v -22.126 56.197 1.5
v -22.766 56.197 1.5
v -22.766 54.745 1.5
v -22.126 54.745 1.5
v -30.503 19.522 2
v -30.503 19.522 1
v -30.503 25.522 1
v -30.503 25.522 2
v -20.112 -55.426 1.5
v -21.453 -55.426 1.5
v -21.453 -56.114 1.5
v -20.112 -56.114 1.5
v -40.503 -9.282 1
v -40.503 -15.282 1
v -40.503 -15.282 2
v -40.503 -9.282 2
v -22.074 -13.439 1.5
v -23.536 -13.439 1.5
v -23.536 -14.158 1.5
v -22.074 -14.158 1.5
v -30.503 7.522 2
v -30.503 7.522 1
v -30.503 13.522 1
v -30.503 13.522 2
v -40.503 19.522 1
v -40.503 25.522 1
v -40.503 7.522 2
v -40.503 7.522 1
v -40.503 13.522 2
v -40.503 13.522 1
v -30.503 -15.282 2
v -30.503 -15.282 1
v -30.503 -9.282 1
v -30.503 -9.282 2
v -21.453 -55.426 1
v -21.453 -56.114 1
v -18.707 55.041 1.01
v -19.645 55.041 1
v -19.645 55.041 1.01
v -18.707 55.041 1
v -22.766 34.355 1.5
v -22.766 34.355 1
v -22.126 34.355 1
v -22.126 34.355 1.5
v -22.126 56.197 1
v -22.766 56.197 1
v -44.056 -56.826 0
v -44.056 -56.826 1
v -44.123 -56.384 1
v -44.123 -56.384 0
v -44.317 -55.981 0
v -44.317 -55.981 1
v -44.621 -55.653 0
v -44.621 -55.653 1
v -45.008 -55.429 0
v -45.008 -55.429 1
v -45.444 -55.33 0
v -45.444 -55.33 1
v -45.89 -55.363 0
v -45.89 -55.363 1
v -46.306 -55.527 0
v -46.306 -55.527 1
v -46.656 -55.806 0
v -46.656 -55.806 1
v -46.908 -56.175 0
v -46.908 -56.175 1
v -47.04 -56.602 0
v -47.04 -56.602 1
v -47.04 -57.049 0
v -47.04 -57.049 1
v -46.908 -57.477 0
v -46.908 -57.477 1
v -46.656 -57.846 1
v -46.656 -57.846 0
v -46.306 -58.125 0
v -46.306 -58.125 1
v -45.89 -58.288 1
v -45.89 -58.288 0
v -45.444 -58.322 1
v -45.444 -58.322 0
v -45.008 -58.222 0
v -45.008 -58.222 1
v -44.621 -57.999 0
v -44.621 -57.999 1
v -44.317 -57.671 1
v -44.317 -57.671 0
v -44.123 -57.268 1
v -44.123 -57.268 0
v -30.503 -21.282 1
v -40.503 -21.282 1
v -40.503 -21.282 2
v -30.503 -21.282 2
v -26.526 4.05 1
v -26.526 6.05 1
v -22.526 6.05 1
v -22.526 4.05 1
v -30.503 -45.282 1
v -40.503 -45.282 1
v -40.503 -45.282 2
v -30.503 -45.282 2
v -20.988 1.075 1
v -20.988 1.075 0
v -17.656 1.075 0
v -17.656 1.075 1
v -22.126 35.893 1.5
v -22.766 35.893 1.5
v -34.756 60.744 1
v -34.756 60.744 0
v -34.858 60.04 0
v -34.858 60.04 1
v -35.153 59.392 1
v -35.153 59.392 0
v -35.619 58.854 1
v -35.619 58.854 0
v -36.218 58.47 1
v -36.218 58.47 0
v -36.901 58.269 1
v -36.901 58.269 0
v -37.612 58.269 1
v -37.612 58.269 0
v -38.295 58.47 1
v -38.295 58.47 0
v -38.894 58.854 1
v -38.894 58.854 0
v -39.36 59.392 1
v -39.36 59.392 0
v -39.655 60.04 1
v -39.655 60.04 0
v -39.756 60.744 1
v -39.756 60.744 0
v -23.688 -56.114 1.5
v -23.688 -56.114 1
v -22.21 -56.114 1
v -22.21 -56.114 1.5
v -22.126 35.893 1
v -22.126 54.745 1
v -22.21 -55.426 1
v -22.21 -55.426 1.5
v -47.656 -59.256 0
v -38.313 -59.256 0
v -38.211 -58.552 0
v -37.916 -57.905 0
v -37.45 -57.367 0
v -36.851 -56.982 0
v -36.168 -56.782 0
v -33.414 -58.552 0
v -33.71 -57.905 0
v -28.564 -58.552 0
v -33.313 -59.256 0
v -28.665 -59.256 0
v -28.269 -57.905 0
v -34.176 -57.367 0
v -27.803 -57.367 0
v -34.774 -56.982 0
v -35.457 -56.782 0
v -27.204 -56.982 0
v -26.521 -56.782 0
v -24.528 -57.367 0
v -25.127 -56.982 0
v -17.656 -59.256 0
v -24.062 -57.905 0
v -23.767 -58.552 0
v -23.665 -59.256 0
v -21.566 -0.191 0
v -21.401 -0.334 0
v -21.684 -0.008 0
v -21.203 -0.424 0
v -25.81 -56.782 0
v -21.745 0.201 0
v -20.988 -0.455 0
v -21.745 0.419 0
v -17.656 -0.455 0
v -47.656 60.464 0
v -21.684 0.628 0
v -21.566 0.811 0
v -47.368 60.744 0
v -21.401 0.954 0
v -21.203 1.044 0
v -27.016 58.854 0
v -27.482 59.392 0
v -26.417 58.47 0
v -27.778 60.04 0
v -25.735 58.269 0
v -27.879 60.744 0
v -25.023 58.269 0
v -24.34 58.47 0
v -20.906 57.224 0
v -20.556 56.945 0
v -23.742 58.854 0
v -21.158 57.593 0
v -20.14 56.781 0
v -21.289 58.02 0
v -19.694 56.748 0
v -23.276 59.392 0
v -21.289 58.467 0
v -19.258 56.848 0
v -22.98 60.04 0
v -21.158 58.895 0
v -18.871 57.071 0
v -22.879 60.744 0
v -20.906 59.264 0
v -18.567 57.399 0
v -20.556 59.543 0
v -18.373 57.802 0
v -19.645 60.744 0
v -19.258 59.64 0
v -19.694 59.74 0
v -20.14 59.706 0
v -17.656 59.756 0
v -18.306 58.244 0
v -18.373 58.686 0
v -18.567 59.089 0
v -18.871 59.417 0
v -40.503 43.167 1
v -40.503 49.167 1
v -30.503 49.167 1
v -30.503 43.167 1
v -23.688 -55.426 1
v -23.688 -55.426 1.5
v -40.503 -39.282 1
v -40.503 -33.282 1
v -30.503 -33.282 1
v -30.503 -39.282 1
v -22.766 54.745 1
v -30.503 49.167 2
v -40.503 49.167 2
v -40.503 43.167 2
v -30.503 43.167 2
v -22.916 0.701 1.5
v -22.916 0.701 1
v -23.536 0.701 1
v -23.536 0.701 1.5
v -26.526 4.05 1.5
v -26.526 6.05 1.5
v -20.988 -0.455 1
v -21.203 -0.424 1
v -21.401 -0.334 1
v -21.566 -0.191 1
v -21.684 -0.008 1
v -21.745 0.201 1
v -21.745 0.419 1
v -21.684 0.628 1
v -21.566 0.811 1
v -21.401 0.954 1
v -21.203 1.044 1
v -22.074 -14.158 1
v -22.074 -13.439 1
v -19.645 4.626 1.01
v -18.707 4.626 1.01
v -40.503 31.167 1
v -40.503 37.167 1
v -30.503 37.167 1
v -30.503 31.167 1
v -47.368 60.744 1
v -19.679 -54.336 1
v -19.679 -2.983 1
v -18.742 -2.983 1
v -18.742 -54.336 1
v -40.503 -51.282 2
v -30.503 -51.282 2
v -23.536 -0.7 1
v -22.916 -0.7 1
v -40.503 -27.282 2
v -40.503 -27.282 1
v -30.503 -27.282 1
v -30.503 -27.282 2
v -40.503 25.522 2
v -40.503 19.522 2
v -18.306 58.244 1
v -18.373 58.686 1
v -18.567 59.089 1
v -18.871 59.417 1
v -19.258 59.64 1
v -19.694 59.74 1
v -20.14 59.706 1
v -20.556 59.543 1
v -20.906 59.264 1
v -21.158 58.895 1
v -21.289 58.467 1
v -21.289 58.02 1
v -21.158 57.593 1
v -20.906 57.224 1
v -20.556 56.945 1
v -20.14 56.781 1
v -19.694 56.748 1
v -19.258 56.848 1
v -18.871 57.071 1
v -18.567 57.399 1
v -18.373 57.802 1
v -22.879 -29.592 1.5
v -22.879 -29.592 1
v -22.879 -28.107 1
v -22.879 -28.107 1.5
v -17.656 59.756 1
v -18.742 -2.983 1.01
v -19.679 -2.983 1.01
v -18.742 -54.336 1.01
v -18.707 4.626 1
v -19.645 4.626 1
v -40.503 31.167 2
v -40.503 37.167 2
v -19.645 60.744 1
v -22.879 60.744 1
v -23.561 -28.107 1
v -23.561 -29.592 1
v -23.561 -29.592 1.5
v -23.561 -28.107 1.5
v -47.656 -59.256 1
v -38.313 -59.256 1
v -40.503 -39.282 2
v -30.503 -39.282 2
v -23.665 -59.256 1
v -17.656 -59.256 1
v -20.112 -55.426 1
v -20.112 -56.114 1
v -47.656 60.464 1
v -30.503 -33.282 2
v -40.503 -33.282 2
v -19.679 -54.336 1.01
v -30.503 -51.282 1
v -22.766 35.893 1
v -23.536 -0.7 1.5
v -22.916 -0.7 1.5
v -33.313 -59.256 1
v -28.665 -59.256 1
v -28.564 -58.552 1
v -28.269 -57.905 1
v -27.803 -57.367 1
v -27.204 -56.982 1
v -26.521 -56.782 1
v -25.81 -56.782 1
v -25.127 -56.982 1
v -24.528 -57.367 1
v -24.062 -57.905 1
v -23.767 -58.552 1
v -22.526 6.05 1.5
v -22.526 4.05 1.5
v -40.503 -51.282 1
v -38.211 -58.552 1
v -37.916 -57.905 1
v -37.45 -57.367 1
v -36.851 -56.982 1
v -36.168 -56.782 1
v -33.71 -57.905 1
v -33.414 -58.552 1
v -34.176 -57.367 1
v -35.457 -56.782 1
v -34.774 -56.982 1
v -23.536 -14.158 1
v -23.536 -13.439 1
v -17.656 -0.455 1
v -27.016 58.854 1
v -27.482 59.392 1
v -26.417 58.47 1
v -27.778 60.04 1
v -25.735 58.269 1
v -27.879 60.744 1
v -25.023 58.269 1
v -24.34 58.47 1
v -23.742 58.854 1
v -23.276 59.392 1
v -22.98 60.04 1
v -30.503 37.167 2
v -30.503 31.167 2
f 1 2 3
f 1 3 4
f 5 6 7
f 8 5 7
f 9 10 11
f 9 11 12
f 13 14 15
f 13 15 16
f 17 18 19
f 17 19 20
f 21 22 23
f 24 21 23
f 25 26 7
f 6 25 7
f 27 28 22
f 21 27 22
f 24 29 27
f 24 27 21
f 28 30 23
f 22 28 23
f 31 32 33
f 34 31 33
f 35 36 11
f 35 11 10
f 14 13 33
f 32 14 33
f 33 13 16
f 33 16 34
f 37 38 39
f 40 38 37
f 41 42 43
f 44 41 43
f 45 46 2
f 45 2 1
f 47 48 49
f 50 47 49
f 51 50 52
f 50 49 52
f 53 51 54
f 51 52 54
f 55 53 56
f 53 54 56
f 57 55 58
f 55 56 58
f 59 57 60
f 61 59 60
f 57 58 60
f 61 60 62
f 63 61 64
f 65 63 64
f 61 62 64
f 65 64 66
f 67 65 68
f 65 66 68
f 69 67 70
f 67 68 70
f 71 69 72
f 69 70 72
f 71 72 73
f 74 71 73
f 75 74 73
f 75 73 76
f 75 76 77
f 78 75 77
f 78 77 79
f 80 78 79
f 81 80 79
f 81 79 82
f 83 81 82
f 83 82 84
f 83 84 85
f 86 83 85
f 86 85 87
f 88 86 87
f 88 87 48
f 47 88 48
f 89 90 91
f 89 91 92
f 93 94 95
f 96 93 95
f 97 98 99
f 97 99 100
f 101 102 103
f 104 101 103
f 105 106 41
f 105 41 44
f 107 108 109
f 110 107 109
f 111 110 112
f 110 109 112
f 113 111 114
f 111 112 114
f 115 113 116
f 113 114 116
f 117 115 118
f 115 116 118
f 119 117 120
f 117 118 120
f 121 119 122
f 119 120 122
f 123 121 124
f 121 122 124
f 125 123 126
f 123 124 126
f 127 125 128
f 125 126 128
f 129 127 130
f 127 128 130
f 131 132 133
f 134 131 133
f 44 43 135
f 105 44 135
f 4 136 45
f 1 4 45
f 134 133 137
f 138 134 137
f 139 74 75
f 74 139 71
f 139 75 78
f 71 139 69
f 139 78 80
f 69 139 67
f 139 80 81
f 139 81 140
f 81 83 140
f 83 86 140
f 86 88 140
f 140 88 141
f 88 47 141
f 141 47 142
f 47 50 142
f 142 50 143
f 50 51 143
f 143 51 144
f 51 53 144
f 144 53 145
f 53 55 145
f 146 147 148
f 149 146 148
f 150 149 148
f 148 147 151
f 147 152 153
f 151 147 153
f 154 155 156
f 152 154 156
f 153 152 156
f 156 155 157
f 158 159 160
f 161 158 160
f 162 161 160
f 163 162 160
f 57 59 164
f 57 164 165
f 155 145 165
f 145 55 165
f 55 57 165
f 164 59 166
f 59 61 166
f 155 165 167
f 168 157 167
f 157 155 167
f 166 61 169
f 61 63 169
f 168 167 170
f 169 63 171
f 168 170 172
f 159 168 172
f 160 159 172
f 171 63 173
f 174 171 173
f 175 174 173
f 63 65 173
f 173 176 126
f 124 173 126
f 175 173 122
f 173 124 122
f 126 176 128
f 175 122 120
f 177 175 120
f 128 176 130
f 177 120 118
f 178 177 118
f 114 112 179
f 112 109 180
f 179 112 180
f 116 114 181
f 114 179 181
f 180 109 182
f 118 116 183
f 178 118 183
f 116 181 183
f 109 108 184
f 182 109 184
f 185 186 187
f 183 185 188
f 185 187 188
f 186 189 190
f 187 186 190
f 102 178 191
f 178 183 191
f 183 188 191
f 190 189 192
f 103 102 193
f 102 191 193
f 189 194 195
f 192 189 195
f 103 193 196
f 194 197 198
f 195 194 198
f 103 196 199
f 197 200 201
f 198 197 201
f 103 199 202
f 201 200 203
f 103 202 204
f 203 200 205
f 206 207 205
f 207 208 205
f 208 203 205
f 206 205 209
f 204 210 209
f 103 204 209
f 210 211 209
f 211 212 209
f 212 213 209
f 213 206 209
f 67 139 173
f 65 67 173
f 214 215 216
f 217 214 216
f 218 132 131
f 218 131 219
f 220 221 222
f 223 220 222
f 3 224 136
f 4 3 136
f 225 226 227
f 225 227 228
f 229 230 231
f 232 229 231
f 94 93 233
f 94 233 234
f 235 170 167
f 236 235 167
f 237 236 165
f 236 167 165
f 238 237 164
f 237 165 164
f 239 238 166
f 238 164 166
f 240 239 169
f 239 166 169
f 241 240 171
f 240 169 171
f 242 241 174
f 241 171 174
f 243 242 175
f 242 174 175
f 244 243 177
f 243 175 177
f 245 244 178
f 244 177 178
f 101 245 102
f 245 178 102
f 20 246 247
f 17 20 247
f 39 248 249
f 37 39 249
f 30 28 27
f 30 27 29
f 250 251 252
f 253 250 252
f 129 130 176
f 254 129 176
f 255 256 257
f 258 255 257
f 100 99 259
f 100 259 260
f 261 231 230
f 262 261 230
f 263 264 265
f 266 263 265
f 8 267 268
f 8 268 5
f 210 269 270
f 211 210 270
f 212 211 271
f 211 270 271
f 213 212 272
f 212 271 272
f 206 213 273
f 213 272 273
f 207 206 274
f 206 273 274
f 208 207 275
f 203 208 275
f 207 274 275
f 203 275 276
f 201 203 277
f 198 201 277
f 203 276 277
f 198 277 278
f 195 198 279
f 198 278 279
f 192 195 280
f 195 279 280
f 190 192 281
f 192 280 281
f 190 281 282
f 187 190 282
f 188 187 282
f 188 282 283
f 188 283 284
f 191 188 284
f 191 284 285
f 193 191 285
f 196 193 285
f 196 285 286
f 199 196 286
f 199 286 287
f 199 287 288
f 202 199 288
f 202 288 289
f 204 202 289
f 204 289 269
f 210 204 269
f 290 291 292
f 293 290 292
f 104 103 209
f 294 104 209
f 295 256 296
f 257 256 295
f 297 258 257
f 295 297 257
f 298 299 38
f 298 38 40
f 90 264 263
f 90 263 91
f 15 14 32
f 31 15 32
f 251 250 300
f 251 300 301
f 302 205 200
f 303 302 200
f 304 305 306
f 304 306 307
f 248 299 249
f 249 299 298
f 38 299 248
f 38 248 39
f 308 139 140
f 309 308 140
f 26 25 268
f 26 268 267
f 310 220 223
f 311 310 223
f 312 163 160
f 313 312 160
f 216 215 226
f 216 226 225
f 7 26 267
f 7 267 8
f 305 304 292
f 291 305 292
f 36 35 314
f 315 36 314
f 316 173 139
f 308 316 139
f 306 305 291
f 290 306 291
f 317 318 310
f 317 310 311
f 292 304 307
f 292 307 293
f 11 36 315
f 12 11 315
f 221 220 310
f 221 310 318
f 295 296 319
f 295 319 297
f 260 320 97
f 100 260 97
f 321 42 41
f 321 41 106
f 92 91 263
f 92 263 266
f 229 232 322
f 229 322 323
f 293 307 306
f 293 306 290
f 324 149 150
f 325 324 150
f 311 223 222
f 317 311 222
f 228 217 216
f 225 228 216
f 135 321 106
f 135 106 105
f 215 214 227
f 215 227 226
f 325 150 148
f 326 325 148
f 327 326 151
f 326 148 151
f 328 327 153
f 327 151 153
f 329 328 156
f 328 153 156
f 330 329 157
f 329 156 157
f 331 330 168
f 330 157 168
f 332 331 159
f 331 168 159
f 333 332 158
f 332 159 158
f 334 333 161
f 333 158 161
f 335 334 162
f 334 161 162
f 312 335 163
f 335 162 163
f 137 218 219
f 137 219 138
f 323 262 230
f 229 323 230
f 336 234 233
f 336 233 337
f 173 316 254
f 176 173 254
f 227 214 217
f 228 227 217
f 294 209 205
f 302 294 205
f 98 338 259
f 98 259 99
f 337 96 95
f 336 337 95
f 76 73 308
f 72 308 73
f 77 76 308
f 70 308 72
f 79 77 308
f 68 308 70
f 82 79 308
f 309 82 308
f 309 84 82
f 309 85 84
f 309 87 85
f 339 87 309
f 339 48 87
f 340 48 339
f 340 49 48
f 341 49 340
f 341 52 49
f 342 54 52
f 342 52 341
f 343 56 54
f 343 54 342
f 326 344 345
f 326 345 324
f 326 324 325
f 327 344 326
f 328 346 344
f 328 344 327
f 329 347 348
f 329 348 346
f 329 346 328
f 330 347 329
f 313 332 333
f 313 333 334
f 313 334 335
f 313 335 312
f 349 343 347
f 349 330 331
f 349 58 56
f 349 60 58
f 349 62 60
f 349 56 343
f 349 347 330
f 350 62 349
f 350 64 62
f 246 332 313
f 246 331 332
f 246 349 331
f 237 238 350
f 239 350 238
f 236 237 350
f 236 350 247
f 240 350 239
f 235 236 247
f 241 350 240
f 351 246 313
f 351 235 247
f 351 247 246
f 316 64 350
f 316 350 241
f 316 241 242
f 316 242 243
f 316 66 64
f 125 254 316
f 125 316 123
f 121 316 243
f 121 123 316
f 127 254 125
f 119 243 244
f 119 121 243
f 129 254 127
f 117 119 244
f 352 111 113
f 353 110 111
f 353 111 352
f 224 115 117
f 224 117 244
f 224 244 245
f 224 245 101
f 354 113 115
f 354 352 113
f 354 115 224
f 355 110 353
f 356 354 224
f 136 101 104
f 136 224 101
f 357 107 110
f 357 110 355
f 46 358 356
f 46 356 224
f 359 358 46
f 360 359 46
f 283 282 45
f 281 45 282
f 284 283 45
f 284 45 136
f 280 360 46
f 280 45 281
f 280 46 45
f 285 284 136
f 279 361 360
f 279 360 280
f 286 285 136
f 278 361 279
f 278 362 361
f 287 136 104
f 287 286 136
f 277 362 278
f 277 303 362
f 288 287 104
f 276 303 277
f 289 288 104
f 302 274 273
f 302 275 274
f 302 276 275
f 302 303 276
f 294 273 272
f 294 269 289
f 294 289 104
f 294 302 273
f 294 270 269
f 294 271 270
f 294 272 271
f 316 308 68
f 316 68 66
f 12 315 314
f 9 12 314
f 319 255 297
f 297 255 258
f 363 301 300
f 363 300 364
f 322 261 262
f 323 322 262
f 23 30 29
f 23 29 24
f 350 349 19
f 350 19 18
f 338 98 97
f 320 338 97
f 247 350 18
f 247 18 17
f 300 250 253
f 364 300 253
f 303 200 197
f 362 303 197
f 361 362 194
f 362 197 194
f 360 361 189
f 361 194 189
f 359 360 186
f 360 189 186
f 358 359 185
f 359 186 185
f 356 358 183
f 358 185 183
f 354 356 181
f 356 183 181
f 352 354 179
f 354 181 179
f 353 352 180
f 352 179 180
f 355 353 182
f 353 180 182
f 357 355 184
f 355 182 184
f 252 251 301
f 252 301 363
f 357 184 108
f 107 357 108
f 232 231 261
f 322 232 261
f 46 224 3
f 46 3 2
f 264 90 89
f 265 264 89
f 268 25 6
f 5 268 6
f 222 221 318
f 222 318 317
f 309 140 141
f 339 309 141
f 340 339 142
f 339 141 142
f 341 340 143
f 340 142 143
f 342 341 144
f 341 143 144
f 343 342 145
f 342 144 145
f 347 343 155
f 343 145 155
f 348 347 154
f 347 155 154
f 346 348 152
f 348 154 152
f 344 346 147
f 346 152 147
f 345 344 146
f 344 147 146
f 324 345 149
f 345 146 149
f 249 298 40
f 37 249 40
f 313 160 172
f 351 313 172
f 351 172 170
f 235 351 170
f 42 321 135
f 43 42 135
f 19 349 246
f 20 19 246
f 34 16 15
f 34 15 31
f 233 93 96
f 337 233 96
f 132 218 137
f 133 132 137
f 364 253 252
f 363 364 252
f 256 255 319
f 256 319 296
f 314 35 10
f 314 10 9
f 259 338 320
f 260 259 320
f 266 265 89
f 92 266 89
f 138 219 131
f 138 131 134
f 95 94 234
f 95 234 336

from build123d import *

# Parameters (mm, degrees)
F1_DEPTH  = 1
F2_W      = 10
F2_H      = 6
F3_DEPTH  = 1
F5_DEPTH  = 25
F6_R      = 1.5
F7_DEPTH  = 25
F8_W      = 4
F8_H      = 2
F9_DEPTH  = 0.5
F10_W     = 10
F10_H     = 6
F11_DEPTH = 1
F12_W     = 0.640901
F12_H     = 1.45201
F12_W_2   = 1.46237
F12_H_2   = 0.719787
F13_DEPTH = 0.5
F14_W     = 0.640901
F14_H     = 1.537751
F14_W_2   = 0.682369
F14_H_2   = 1.484867
F15_DEPTH = 0.5
F16_W     = 1.478707
F16_H     = 0.68773
F16_W_2   = 1.341155
F17_DEPTH = 0.5
F18_W     = 0.937498
F18_H     = 50.415176
F19_DEPTH = 0.01
F20_W     = 0.937
F20_H     = 51.353466
F21_DEPTH = 0.01


with BuildPart() as f1:
    # F0 (on Top) → F1 (new body)
    with BuildSketch(Plane.XY):
        with BuildLine():
            Line((-39.756494, 60.743838), (-47.655948, 60.743838))
            Line((-47.655948, 60.743838), (-47.655948, -59.256162))
            Line((-47.655948, -59.256162), (-38.312687, -59.256162))
            ThreePointArc((-38.312687, -59.256162), (-35.812687, -56.756162), (-33.312687, -59.256162))
            Line((-33.312687, -59.256162), (-28.665433, -59.256162))
            ThreePointArc((-28.665433, -59.256162), (-26.165433, -56.756162), (-23.665433, -59.256162))
            Line((-23.665433, -59.256162), (-17.655948, -59.256162))
            Line((-17.655948, -59.256162), (-17.655948, -0.455188))
            Line((-17.655948, -0.455188), (-20.987641, -0.455188))
            ThreePointArc((-20.987641, -0.455188), (-21.7529, 0.310071), (-20.987641, 1.07533))
            Line((-20.987641, 1.07533), (-17.655948, 1.07533))
            Line((-17.655948, 1.07533), (-17.655948, 59.755523))
            Line((-17.655948, 59.755523), (-19.64468, 60.743838))
            Line((-19.64468, 60.743838), (-22.878788, 60.743838))
            ThreePointArc((-22.878788, 60.743838), (-25.378788, 58.243838), (-27.878788, 60.743838))
            Line((-27.878788, 60.743838), (-34.756494, 60.743838))
            ThreePointArc((-34.756494, 60.743838), (-37.256494, 58.243838), (-39.756494, 60.743838))
        make_face()
    extrude(amount=F1_DEPTH)

    # F4 (on face) → F5 (cut)
    with BuildSketch(Plane.XY.offset(1)):
        Polygon((-47.655948, 60.46449), (-47.368012, 60.743838), (-47.655948, 60.743838), align=None)
    extrude(amount=-F5_DEPTH, mode=Mode.SUBTRACT)

    # F6 (on face) → F7 (cut)
    with BuildSketch(Plane.XY.offset(1)):
        with Locations((-19.806085, 58.243838)):
            Circle(F6_R)
        with Locations((-45.556497, -56.825764)):
            Circle(F6_R)
    extrude(amount=-F7_DEPTH, mode=Mode.SUBTRACT)

    # F12 (on face) → F13 (join)
    with BuildSketch(Plane.XY.offset(1)):
        with Locations((-22.445988, 55.470789)):
            Rectangle(F12_W, F12_H)
        with Locations((-22.804821, -13.798419)):
            Rectangle(F12_W_2, F12_H_2)
    extrude(amount=F13_DEPTH)


with BuildPart() as f3:
    # F2 (on face) → F3 (new body)
    with BuildSketch(Plane.XY.offset(1)):
        with Locations((-35.50325, 10.522216)):
            Rectangle(F2_W, F2_H)
        with Locations((-35.50325, 22.522216)):
            Rectangle(F2_W, F2_H)
        with Locations((-35.50325, 34.167397)):
            Rectangle(F2_W, F2_H)
        with Locations((-35.50325, 46.167397)):
            Rectangle(F2_W, F2_H)
    extrude(amount=F3_DEPTH)


with BuildPart() as f9:
    # F8 (on face) → F9 (new body)
    with BuildSketch(Plane.XY.offset(1)):
        Polygon((-22.915684, -0.7), (-22.915684, 0), (-22.915684, 0.701013), (-23.536006, 0.701013), (-23.536006, -0.7), align=None)
        with Locations((-24.525962, 5.050029)):
            Rectangle(F8_W, F8_H)
    extrude(amount=F9_DEPTH)


with BuildPart() as f11:
    # F10 (on face) → F11 (new body)
    with BuildSketch(Plane.XY.offset(1)):
        with Locations((-35.50325, -48.282394)):
            Rectangle(F10_W, F10_H)
        with Locations((-35.50325, -36.282394)):
            Rectangle(F10_W, F10_H)
        with Locations((-35.50325, -24.282394)):
            Rectangle(F10_W, F10_H)
        with Locations((-35.50325, -12.282394)):
            Rectangle(F10_W, F10_H)
    extrude(amount=F11_DEPTH)


with BuildPart() as f15:
    # F14 (on face) → F15 (new body)
    with BuildSketch(Plane.XY.offset(1)):
        with Locations((-22.445988, 35.124359)):
            Rectangle(F14_W, F14_H)
        with Locations((-23.219972, -28.849742)):
            Rectangle(F14_W_2, F14_H_2)
    extrude(amount=F15_DEPTH)


with BuildPart() as f17:
    # F16 (on face) → F17 (new body)
    with BuildSketch(Plane.XY.offset(1)):
        with Locations((-22.948895, -55.770071)):
            Rectangle(F16_W, F16_H)
        with Locations((-20.782418, -55.770071)):
            Rectangle(F16_W_2, F16_H)
    extrude(amount=F17_DEPTH)


with BuildPart() as f19:
    # F18 (on face) → F19 (new body)
    with BuildSketch(Plane.XY.offset(1)):
        with Locations((-19.175931, 29.833196)):
            Rectangle(F18_W, F18_H)
    extrude(amount=F19_DEPTH)


with BuildPart() as f21:
    # F20 (on face) → F21 (new body)
    with BuildSketch(Plane.XY.offset(1)):
        with Locations((-19.210921, -28.659517)):
            Rectangle(F20_W, F20_H)
    extrude(amount=F21_DEPTH)


solid = Compound([f1.part, f3.part, f9.part, f11.part, f15.part, f17.part, f19.part, f21.part])
